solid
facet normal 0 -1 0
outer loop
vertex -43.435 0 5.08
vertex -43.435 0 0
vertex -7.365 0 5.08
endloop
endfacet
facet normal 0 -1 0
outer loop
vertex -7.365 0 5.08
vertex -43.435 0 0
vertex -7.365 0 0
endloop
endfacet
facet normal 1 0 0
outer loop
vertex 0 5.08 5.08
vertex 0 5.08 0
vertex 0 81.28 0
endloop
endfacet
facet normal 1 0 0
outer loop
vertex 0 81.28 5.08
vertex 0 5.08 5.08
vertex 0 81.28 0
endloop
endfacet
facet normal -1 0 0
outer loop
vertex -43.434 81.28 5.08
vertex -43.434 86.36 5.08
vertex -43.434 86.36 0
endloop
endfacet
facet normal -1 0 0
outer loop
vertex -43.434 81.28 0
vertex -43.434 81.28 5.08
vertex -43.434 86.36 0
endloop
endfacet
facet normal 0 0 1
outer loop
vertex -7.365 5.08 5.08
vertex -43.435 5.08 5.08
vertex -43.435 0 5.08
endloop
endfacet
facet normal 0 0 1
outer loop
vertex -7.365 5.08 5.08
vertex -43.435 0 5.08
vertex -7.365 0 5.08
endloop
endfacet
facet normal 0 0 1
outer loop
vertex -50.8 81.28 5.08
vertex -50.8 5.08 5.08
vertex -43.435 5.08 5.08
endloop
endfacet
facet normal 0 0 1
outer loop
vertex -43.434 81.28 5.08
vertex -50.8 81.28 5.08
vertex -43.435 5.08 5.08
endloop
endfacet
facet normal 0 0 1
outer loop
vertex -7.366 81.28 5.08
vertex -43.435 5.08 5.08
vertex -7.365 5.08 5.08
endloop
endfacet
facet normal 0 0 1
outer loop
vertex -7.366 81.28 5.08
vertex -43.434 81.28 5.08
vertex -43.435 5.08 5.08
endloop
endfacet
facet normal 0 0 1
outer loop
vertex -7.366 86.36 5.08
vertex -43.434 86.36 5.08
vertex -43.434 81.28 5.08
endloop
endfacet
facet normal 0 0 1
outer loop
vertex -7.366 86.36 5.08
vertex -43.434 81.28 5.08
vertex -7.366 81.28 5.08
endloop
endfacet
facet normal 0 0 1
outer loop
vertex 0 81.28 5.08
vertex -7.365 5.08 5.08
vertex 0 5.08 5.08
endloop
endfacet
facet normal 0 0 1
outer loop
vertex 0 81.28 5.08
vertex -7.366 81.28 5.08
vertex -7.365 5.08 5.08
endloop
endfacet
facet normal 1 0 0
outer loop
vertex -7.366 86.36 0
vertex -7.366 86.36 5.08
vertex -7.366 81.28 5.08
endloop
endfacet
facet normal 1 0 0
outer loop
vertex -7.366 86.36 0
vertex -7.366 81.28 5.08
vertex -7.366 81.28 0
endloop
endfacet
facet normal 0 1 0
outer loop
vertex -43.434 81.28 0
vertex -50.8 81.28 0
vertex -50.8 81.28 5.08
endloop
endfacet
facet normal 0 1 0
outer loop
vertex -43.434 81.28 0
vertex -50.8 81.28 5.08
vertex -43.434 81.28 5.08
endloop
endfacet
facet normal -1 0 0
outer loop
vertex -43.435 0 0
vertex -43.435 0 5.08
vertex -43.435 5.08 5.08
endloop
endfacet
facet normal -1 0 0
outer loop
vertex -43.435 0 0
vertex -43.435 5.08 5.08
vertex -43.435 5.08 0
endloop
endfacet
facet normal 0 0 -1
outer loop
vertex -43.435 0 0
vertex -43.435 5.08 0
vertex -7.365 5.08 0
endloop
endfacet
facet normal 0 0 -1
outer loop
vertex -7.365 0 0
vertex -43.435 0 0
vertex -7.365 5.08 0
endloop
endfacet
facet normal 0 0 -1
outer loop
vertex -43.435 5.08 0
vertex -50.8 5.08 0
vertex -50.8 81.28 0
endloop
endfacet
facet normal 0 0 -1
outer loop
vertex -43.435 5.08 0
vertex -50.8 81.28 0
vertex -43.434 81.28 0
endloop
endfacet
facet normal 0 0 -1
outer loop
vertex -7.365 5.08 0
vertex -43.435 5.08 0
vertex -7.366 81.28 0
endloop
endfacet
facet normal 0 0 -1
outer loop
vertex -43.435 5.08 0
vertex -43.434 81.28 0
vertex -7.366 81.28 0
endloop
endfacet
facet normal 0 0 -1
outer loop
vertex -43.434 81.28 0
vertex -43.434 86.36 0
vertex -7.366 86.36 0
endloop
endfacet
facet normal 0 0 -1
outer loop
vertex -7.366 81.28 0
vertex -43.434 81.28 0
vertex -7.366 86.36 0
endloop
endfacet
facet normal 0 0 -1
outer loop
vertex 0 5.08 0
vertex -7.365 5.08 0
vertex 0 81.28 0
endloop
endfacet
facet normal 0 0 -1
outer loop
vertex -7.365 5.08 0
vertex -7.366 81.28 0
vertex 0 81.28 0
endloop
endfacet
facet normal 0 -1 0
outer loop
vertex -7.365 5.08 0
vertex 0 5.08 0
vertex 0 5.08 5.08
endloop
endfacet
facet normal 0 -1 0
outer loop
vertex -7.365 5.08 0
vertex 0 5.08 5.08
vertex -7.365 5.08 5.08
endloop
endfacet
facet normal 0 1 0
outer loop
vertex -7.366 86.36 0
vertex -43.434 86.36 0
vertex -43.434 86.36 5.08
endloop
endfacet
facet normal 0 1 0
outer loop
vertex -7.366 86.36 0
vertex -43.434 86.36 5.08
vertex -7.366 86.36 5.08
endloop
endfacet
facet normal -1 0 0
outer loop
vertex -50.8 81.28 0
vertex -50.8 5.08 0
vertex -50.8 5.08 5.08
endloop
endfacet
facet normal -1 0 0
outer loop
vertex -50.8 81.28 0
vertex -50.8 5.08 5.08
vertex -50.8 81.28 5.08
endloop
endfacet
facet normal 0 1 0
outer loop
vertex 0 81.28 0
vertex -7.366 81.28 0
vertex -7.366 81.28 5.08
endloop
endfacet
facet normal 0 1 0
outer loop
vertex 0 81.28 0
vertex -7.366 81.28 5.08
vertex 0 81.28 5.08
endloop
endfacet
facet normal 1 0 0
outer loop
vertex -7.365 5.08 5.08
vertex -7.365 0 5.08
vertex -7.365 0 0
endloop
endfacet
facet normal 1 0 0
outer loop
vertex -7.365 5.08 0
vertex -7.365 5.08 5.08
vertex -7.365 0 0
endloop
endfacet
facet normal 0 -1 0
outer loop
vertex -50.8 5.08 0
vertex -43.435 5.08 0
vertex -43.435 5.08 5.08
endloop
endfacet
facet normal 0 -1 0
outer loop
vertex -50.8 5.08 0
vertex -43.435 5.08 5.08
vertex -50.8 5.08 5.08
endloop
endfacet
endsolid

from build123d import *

# Parameters (mm, degrees)
SKETCH1_W           = 50.8
SKETCH1_H           = 86.36
BOSS_EXTRUDE1_DEPTH = 5.08
SKETCH2_W           = 7.366
SKETCH2_H           = 5.08
CUT_EXTRUDE1_DEPTH  = 5.08
SKETCH6_W           = 7.365
SKETCH6_H           = 5.08
CUT_EXTRUDE2_DEPTH  = 5.08


with BuildPart() as part:
    # Sketch1 → Boss-Extrude1 (new body)
    with BuildSketch(Plane.XY):
        with Locations((-25.4, 43.18)):
            Rectangle(SKETCH1_W, SKETCH1_H)
    extrude(amount=BOSS_EXTRUDE1_DEPTH)

    # Sketch2 → Cut-Extrude1 (cut)
    with BuildSketch(Plane(origin=(0, 86.36, 0), x_dir=(1, 0, 0), z_dir=(0, 1, 0))):
        with Locations((-47.117, -2.54)):
            Rectangle(SKETCH2_W, SKETCH2_H)
        with Locations((-3.683, -2.54)):
            Rectangle(SKETCH2_W, SKETCH2_H)
    extrude(amount=-CUT_EXTRUDE1_DEPTH, mode=Mode.SUBTRACT)

    # Sketch6 → Cut-Extrude2 (cut)
    with BuildSketch(Plane(origin=(0, 0, 0), x_dir=(-1, 0, 0), z_dir=(0, -1, 0))):
        with Locations((47.1175, -2.54)):
            Rectangle(SKETCH6_W, SKETCH6_H)
        with Locations((3.6825, -2.54)):
            Rectangle(SKETCH6_W, SKETCH6_H)
    extrude(amount=-CUT_EXTRUDE2_DEPTH, mode=Mode.SUBTRACT)


solid = part.part
